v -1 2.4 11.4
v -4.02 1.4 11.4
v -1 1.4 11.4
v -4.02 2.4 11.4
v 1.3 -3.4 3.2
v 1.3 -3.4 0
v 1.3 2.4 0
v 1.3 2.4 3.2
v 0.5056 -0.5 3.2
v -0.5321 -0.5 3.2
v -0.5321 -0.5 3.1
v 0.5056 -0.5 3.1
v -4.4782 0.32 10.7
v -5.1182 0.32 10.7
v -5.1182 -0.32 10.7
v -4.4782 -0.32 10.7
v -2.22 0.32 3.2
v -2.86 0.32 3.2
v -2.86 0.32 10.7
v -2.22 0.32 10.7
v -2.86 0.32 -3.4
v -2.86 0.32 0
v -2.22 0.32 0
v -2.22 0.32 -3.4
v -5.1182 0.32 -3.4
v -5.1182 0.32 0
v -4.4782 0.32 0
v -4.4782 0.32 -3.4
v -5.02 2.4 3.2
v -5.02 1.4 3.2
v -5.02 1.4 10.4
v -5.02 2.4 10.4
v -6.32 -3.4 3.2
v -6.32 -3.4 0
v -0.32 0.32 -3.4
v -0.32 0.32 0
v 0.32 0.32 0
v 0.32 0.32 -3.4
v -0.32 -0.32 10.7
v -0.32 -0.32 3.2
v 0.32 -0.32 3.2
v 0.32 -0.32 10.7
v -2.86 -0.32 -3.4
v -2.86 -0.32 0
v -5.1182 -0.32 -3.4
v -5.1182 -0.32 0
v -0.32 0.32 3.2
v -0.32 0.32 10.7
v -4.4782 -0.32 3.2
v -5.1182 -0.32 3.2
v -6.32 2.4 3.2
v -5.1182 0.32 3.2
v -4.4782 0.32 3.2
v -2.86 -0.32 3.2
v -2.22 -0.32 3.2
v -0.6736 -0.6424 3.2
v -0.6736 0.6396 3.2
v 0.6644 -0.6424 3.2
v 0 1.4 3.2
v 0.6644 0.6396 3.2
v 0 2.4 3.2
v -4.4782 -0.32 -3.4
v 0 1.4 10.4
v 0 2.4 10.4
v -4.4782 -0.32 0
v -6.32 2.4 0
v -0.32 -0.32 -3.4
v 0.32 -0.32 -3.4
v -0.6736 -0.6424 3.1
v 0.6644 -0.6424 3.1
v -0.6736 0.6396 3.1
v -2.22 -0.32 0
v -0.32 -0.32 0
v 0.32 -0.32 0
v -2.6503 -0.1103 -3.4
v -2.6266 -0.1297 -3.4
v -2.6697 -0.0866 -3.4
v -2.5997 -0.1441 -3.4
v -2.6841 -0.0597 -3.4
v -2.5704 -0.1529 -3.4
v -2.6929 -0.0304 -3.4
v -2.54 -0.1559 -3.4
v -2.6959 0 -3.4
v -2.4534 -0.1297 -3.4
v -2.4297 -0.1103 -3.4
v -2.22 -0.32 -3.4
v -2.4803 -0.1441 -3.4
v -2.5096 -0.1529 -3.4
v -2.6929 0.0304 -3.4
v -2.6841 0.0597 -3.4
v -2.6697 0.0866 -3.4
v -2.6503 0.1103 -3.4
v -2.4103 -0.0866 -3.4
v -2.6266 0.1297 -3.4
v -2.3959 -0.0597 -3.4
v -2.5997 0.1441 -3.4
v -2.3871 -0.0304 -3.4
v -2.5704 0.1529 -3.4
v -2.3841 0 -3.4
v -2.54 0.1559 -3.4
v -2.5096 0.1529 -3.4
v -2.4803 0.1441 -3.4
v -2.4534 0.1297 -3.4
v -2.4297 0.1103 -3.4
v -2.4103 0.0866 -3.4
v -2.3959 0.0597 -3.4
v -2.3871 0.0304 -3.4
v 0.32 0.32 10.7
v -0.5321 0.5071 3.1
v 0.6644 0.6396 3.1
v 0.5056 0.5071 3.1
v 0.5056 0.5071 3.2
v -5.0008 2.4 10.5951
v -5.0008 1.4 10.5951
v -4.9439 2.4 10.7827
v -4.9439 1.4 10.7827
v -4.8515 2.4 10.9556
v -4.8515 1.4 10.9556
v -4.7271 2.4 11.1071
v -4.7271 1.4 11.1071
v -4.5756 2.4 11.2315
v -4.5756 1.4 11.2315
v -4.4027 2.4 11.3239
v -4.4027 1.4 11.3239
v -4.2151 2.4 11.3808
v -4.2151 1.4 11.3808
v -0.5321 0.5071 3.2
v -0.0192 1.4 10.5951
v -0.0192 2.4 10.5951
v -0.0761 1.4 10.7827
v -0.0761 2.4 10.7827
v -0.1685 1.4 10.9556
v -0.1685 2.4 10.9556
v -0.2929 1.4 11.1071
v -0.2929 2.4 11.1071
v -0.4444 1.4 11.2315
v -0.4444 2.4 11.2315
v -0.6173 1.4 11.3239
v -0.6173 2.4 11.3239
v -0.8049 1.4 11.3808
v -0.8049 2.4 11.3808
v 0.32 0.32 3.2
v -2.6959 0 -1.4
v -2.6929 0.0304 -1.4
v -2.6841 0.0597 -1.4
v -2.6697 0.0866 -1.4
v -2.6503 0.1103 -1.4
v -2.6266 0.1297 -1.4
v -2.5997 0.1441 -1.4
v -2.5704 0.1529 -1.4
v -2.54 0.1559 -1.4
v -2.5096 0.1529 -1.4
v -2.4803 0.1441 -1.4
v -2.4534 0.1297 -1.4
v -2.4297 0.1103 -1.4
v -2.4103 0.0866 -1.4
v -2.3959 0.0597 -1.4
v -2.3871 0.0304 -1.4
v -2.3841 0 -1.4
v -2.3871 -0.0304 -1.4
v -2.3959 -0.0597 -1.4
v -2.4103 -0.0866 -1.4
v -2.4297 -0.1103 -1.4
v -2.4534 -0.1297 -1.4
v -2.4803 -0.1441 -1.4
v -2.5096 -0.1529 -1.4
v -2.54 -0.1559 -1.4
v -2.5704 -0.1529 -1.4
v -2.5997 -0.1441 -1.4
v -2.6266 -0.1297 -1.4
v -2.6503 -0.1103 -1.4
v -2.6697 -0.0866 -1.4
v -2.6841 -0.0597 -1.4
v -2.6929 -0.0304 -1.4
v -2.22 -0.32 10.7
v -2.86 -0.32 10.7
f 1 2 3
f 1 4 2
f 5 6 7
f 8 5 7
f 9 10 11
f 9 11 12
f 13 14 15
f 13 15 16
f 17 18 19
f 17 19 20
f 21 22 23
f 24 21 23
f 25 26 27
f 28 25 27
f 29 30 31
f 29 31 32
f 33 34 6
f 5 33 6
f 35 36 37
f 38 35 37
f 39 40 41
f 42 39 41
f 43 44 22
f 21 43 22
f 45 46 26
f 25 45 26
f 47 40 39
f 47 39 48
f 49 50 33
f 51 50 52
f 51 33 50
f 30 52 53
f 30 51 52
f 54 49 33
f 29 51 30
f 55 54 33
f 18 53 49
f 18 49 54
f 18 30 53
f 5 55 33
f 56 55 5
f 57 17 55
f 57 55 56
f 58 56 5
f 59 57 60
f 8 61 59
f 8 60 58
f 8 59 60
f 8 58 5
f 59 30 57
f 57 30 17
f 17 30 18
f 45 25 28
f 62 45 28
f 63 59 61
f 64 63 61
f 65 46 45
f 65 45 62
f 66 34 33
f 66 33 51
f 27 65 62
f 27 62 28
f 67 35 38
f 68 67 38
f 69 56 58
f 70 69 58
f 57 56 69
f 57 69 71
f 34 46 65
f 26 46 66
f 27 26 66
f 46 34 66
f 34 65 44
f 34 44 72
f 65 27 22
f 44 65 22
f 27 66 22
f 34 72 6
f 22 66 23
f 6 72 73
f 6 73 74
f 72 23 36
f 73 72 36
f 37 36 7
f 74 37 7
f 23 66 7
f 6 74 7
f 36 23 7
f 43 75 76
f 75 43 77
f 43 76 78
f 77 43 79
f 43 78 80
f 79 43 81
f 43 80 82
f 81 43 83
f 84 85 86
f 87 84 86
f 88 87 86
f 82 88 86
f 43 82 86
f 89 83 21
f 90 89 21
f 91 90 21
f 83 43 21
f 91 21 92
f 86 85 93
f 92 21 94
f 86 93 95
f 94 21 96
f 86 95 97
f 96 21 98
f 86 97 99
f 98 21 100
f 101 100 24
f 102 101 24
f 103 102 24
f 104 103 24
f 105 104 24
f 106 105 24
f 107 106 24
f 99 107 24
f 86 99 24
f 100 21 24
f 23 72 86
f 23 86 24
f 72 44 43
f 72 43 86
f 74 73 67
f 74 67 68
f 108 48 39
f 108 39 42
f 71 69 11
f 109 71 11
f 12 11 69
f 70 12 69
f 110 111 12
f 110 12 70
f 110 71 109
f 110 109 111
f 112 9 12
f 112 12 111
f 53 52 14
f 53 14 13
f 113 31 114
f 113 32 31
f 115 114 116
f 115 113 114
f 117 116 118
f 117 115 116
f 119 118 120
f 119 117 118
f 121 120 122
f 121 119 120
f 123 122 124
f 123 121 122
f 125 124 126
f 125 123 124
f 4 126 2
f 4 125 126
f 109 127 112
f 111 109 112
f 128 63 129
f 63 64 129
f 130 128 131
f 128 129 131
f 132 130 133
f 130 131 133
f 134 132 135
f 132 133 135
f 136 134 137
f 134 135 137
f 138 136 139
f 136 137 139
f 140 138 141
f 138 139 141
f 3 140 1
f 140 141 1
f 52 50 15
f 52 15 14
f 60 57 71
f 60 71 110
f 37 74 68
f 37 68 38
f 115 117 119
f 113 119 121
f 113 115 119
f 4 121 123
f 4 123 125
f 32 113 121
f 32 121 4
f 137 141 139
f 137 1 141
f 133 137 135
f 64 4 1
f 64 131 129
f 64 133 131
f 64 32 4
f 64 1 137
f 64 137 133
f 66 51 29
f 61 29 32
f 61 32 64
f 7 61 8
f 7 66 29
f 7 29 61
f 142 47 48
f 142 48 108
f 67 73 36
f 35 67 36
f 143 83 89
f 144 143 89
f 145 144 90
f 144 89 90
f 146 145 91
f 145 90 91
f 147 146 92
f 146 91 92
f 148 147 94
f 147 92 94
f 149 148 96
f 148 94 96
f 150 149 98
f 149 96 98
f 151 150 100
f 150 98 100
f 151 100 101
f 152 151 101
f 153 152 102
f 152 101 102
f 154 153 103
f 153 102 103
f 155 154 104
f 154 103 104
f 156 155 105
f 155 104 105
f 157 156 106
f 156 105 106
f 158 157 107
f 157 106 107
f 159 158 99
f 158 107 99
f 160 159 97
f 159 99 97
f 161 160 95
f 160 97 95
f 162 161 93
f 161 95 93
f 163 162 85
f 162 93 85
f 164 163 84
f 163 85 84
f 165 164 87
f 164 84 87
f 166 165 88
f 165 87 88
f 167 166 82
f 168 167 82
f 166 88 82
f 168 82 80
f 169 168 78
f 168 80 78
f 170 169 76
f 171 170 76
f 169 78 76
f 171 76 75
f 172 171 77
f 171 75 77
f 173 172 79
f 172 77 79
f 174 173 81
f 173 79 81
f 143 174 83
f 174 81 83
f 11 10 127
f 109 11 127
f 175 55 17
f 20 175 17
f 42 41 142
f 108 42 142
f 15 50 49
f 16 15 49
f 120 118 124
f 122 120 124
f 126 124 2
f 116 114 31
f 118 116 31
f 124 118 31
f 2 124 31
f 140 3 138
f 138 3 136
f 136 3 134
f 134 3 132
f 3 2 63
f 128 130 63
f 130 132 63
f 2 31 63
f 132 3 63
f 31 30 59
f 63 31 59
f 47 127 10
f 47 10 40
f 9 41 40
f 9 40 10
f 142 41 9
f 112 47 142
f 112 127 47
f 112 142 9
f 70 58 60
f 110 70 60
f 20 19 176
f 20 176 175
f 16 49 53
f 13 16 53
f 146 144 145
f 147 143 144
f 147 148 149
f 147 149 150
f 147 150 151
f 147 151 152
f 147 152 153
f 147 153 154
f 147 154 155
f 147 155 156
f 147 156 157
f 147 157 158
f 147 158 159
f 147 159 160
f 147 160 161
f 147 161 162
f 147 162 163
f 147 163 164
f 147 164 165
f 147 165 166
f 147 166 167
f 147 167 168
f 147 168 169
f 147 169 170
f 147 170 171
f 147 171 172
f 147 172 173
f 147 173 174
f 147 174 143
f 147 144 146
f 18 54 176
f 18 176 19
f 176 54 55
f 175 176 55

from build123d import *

# Parameters (mm, degrees)
SKETCH_2_W          = 7.62
SKETCH_2_H          = 5.8
EXTRUDE_1_DEPTH     = 3.2
SKETCH_3_W          = 5.02
SKETCH_3_H          = 1
EXTRUDE_4_DEPTH     = 8.2
FILLET_1_R          = 1
SKETCH_1_W          = 0.64
SKETCH_1_H          = 0.64
EXTRUDE_5_DEPTH     = 10.7
SKETCH_1_3_W        = 0.64
SKETCH_1_3_H        = 0.64
EXTRUDE_6_DEPTH     = 3.4
SKETCH_4_W          = 1.33797987
SKETCH_4_H          = 1.281998632
SKETCH_4_W_2        = 1.037697307
SKETCH_4_H_2        = 1.007056107
CUT_EXTRUDE_1_DEPTH = 0.1
SKETCH_5_R          = 0.155933924
CUT_EXTRUDE_2_DEPTH = 2


with BuildPart() as part:
    # Эскиз2 → Вытянуть1 (new body)
    with BuildSketch(Plane.XY):
        with Locations((-2.51, -0.5)):
            Rectangle(SKETCH_2_W, SKETCH_2_H)
    extrude(amount=EXTRUDE_1_DEPTH)

    # Эскиз3 → Вытянуть4 (add)
    with BuildSketch(Plane.XY.offset(3.2)):
        with Locations((-2.51, 1.9)):
            Rectangle(SKETCH_3_W, SKETCH_3_H)
    extrude(amount=EXTRUDE_4_DEPTH)

    # Скругление1
    fillet_1_edges = [part.edges().sort_by_distance(p)[0] for p in [
        (0, 1.9, 11.4),
        (-5.02, 1.9, 11.4),
    ]]
    fillet(fillet_1_edges, radius=FILLET_1_R)

    # Эскиз1 → Вытянуть5 (add)
    with BuildSketch(Plane.XY):
        Rectangle(SKETCH_1_W, SKETCH_1_H)
        with Locations((-2.54, 0)):
            Rectangle(SKETCH_1_W, SKETCH_1_H)
        with Locations((-4.798195283, 0)):
            Rectangle(SKETCH_1_W, SKETCH_1_H)
    extrude(amount=EXTRUDE_5_DEPTH)

    # Эскиз1<3> → Вытянуть6 (add)
    with BuildSketch(Plane.XY):
        Rectangle(SKETCH_1_3_W, SKETCH_1_3_H)
        with Locations((-2.54, 0)):
            Rectangle(SKETCH_1_3_W, SKETCH_1_3_H)
        with Locations((-4.798195283, 0)):
            Rectangle(SKETCH_1_3_W, SKETCH_1_3_H)
    extrude(amount=-EXTRUDE_6_DEPTH)

    # Эскиз4 → Вырез-Вытянуть1 (cut)
    with BuildSketch(Plane(origin=(-0.765860317, 1.721958185, 3.2), x_dir=(1, 0, 0), z_dir=(0, 0, 1))):
        with Locations((0.761284953, -1.723378162)):
            Rectangle(SKETCH_4_W, SKETCH_4_H)
        with Locations((0.75264785, -1.718405131)):
            Rectangle(SKETCH_4_W_2, SKETCH_4_H_2, mode=Mode.SUBTRACT)
    extrude(amount=-CUT_EXTRUDE_1_DEPTH, mode=Mode.SUBTRACT)

    # Эскиз5 → Вырез-Вытянуть2 (cut)
    with BuildSketch(Plane(origin=(0, 0, -3.4), x_dir=(-1, 0, 0), z_dir=(0, 0, -1))):
        with Locations((2.54, 0)):
            Circle(SKETCH_5_R)
    extrude(amount=-CUT_EXTRUDE_2_DEPTH, mode=Mode.SUBTRACT)


solid = part.part
